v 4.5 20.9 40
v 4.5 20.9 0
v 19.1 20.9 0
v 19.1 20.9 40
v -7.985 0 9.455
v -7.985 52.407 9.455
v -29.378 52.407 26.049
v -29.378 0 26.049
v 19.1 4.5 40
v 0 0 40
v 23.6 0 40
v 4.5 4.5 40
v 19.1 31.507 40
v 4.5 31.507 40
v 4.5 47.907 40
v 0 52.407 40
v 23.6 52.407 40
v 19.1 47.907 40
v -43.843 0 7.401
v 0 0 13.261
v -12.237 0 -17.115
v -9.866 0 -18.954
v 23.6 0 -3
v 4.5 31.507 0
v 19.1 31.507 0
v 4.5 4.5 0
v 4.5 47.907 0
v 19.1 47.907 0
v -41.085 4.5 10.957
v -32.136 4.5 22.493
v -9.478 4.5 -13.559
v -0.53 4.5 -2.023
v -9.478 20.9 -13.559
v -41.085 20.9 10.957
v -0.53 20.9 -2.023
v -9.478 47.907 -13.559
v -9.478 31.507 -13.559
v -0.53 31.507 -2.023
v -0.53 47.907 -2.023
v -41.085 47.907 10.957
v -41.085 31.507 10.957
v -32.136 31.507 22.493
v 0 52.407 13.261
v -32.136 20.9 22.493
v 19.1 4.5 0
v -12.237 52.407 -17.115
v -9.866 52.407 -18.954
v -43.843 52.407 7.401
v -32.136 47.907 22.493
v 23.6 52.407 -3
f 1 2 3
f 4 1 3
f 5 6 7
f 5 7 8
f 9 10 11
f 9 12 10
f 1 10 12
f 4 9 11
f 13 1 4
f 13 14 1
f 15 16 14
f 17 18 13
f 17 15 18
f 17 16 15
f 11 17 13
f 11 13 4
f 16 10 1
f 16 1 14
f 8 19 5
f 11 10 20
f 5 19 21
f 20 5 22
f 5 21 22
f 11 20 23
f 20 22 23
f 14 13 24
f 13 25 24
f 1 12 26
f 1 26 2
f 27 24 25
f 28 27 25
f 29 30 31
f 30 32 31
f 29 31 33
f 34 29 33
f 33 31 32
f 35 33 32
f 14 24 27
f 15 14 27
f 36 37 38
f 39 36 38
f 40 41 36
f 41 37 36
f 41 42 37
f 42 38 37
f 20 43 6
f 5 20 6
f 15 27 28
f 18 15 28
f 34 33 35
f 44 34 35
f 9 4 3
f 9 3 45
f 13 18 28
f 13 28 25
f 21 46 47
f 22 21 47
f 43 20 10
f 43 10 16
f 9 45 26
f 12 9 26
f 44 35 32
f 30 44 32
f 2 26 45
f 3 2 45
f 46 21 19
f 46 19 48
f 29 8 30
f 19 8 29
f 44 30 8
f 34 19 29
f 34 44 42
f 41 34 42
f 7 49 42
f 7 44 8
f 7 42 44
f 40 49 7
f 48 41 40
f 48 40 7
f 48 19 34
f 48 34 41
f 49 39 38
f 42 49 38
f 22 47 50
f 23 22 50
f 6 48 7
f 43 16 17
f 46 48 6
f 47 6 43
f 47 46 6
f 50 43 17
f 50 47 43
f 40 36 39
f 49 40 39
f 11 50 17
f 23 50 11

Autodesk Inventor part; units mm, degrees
ref_plane "YZ Plane" through (0, 0, 0) normal (1, 0, 0) x (0, 1, 0)
ref_plane "XZ Plane" through (0, 0, 0) normal (0, 1, 0) x (-1, 0, 0)
sketch "Sketch1" plane through (0, 0, 0) normal (0, 0, 1) x (1, 0, 0)
  line L0 (19.1, 20.9) -> (4.5, 20.9) construction
  line L1 (19.1, 20.9) -> (19.1, 4.5) construction
  line L2 (19.1, 4.5) -> (4.5, 4.5) construction
  line L3 (4.5, 4.5) -> (4.5, 20.9) construction
  line L4 (4.5, 47.9069) -> (4.5, 31.5069) construction
  line L5 (19.1, 47.9069) -> (4.5, 47.9069) construction
  line L6 (19.1, 31.5069) -> (19.1, 47.9069) construction
  line L7 (4.5, 31.5069) -> (19.1, 31.5069) construction
  line L8 (0, 0) -> (0, 52.4069) construction
  line L9 (0, 0) -> (23.6, 0) construction
  line L10 (23.6, 0) -> (23.6, 52.4069) construction
  line L11 (0, 52.4069) -> (23.6, 52.4069) construction
  line L12 (0, 52.4069) -> (0, 0) construction
  line L13 (23.6, 0) -> (23.6, 52.4069) construction
  line L14 (0, 52.4069) -> (23.6, 52.4069)
  line L15 (23.6, 52.4069) -> (23.6, 0)
  line L16 (23.6, 0) -> (0, 0)
  line L17 (0, 0) -> (0, 52.4069)
  line L18 (4.5, 4.5) -> (4.5, 20.9) construction
  line L19 (19.1, 20.9) -> (19.1, 4.5) construction
  line L20 (4.5, 20.9) -> (19.1, 20.9)
  line L21 (19.1, 20.9) -> (19.1, 4.5)
  line L22 (19.1, 4.5) -> (4.5, 4.5)
  line L23 (4.5, 4.5) -> (4.5, 20.9)
  line L24 (4.5, 47.9069) -> (19.1, 47.9069)
  line L25 (19.1, 47.9069) -> (19.1, 31.5069)
  line L26 (19.1, 31.5069) -> (4.5, 31.5069)
  line L27 (4.5, 31.5069) -> (4.5, 47.9069)
  point P0 (0, 0)
  point P1 (-49.87, 37.7316)
extrude "Extrusion1" add sketch "Sketch1" along normal blind 40
sketch "Sketch2" plane through (0, 52.4069, 0) normal (0, 1, 0) x (1, 0, 0)
  line L0 (0, 0) -> (23.6, 0) construction
  line L1 (0, 0) -> (0, -40) construction
  line L2 (23.6, -40) -> (0, -40) construction
  line L3 (23.6, 0) -> (23.6, -40) construction
  line L4 (4.5, 0) -> (-0.53, 0)
  line L5 (4.5, 0) -> (9.53, 0) construction
  line L6 (-0.53, 0) -> (-0.53, 2.023)
  line L7 (-0.53, 0) -> (1.493, 0) construction
ref_plane "Work Plane1" through (-0.53, 52.4069, -2.023) normal (-0.790155, 0, 0.6129071) x (0, 1, 0)
sketch "Sketch3" plane through (-0.53, 52.4069, -2.023) normal (-0.790155, 0, 0.6129071) x (0, 1, 0)
  line L0 (-20.9, 14.6) -> (-20.9, 0) construction
  line L1 (-20.9, 14.6) -> (-4.5, 14.6) construction
  line L2 (-4.5, 14.6) -> (-4.5, 0) construction
  line L3 (-4.5, 0) -> (-20.9, 0) construction
  line L4 (-47.9069, 0) -> (-31.5069, 0) construction
  line L5 (-47.9069, 14.6) -> (-47.9069, 0) construction
  line L6 (-31.5069, 14.6) -> (-47.9069, 14.6) construction
  line L7 (-31.5069, 0) -> (-31.5069, 14.6) construction
  line L8 (0, -4.5) -> (-52.4069, -4.5) construction
  line L9 (0, -4.5) -> (0, 19.1) construction
  line L10 (0, 19.1) -> (-52.4069, 19.1) construction
  line L11 (-52.4069, -4.5) -> (-52.4069, 19.1) construction
  line L12 (-52.4069, -4.5) -> (0, -4.5) construction
  line L13 (0, 19.1) -> (-52.4069, 19.1) construction
  line L14 (-52.4069, -4.5) -> (-52.4069, 19.1)
  line L15 (-52.4069, 19.1) -> (0, 19.1)
  line L16 (0, 19.1) -> (0, -4.5)
  line L17 (0, -4.5) -> (-52.4069, -4.5)
  line L18 (-4.5, 0) -> (-20.9, 0) construction
  line L19 (-20.9, 14.6) -> (-4.5, 14.6) construction
  line L20 (-20.9, 0) -> (-20.9, 14.6)
  line L21 (-20.9, 14.6) -> (-4.5, 14.6)
  line L22 (-4.5, 14.6) -> (-4.5, 0)
  line L23 (-4.5, 0) -> (-20.9, 0)
  line L24 (-47.9069, 0) -> (-47.9069, 14.6)
  line L25 (-47.9069, 14.6) -> (-31.5069, 14.6)
  line L26 (-31.5069, 14.6) -> (-31.5069, 0)
  line L27 (-31.5069, 0) -> (-47.9069, 0)
  point P0 (-52.4069, -1.9233)
  point P1 (-49.87, 37.7316)
  point P2 (-4.5, 0)
extrude "Extrusion2" add sketch "Sketch3" along normal blind 40
sketch "Sketch4" plane through (0, 52.4069, 40) normal (0, 1, 0) x (1, 0, 0)
  line L0 (-12.2365, 57.115) -> (-43.8427, 32.5987) construction
  line L1 (1.0392, 40) -> (23.6, 40) construction
  line L2 (23.6, 40) -> (23.6, 43)
  line L3 (23.6, 40) -> (26.6, 40) construction
  line L4 (-12.2365, 57.115) -> (-9.8661, 58.9537)
  line L5 (-9.8661, 58.9537) -> (23.6, 43)
  line L6 (1.0392, 40) -> (-12.2365, 57.115) construction
  line L7 (-12.2365, 57.115) -> (1.0392, 40)
  line L8 (23.6, 40) -> (1.0392, 40) construction
  line L9 (1.0392, 40) -> (23.6, 40)
  point P0 (0, 40)
  point P1 (4.5, 40)
  point P2 (-0.53, 42.023)
  dimension "d9" = 3
  dimension "d10" = 90
  dimension "d11" = 3
extrude "Extrusion3" add sketch "Sketch4" against normal up to surface (52.4069 mm away)
sketch "Sketch5" plane through (0, 52.4069, 40) normal (0, 1, 0) x (1, 0, 0)
  line L0 (-9.8661, 58.9537) -> (23.6, 43) construction
  line L1 (0, 36.739) -> (0, 0) construction
  line L2 (0, 36.739) -> (0, 26.739)
  line L3 (0, 26.739) -> (-7.9847, 30.5454)
  line L4 (0, 36.739) -> (-7.9847, 30.5454)
  line L5 (0, 36.739) -> (-29.3781, 13.951) construction
  point P0 (0, 40)
extrude "Extrusion4" add sketch "Sketch5" against normal up to surface (52.4069 mm away)
properties part number "backwheel_Cap"
